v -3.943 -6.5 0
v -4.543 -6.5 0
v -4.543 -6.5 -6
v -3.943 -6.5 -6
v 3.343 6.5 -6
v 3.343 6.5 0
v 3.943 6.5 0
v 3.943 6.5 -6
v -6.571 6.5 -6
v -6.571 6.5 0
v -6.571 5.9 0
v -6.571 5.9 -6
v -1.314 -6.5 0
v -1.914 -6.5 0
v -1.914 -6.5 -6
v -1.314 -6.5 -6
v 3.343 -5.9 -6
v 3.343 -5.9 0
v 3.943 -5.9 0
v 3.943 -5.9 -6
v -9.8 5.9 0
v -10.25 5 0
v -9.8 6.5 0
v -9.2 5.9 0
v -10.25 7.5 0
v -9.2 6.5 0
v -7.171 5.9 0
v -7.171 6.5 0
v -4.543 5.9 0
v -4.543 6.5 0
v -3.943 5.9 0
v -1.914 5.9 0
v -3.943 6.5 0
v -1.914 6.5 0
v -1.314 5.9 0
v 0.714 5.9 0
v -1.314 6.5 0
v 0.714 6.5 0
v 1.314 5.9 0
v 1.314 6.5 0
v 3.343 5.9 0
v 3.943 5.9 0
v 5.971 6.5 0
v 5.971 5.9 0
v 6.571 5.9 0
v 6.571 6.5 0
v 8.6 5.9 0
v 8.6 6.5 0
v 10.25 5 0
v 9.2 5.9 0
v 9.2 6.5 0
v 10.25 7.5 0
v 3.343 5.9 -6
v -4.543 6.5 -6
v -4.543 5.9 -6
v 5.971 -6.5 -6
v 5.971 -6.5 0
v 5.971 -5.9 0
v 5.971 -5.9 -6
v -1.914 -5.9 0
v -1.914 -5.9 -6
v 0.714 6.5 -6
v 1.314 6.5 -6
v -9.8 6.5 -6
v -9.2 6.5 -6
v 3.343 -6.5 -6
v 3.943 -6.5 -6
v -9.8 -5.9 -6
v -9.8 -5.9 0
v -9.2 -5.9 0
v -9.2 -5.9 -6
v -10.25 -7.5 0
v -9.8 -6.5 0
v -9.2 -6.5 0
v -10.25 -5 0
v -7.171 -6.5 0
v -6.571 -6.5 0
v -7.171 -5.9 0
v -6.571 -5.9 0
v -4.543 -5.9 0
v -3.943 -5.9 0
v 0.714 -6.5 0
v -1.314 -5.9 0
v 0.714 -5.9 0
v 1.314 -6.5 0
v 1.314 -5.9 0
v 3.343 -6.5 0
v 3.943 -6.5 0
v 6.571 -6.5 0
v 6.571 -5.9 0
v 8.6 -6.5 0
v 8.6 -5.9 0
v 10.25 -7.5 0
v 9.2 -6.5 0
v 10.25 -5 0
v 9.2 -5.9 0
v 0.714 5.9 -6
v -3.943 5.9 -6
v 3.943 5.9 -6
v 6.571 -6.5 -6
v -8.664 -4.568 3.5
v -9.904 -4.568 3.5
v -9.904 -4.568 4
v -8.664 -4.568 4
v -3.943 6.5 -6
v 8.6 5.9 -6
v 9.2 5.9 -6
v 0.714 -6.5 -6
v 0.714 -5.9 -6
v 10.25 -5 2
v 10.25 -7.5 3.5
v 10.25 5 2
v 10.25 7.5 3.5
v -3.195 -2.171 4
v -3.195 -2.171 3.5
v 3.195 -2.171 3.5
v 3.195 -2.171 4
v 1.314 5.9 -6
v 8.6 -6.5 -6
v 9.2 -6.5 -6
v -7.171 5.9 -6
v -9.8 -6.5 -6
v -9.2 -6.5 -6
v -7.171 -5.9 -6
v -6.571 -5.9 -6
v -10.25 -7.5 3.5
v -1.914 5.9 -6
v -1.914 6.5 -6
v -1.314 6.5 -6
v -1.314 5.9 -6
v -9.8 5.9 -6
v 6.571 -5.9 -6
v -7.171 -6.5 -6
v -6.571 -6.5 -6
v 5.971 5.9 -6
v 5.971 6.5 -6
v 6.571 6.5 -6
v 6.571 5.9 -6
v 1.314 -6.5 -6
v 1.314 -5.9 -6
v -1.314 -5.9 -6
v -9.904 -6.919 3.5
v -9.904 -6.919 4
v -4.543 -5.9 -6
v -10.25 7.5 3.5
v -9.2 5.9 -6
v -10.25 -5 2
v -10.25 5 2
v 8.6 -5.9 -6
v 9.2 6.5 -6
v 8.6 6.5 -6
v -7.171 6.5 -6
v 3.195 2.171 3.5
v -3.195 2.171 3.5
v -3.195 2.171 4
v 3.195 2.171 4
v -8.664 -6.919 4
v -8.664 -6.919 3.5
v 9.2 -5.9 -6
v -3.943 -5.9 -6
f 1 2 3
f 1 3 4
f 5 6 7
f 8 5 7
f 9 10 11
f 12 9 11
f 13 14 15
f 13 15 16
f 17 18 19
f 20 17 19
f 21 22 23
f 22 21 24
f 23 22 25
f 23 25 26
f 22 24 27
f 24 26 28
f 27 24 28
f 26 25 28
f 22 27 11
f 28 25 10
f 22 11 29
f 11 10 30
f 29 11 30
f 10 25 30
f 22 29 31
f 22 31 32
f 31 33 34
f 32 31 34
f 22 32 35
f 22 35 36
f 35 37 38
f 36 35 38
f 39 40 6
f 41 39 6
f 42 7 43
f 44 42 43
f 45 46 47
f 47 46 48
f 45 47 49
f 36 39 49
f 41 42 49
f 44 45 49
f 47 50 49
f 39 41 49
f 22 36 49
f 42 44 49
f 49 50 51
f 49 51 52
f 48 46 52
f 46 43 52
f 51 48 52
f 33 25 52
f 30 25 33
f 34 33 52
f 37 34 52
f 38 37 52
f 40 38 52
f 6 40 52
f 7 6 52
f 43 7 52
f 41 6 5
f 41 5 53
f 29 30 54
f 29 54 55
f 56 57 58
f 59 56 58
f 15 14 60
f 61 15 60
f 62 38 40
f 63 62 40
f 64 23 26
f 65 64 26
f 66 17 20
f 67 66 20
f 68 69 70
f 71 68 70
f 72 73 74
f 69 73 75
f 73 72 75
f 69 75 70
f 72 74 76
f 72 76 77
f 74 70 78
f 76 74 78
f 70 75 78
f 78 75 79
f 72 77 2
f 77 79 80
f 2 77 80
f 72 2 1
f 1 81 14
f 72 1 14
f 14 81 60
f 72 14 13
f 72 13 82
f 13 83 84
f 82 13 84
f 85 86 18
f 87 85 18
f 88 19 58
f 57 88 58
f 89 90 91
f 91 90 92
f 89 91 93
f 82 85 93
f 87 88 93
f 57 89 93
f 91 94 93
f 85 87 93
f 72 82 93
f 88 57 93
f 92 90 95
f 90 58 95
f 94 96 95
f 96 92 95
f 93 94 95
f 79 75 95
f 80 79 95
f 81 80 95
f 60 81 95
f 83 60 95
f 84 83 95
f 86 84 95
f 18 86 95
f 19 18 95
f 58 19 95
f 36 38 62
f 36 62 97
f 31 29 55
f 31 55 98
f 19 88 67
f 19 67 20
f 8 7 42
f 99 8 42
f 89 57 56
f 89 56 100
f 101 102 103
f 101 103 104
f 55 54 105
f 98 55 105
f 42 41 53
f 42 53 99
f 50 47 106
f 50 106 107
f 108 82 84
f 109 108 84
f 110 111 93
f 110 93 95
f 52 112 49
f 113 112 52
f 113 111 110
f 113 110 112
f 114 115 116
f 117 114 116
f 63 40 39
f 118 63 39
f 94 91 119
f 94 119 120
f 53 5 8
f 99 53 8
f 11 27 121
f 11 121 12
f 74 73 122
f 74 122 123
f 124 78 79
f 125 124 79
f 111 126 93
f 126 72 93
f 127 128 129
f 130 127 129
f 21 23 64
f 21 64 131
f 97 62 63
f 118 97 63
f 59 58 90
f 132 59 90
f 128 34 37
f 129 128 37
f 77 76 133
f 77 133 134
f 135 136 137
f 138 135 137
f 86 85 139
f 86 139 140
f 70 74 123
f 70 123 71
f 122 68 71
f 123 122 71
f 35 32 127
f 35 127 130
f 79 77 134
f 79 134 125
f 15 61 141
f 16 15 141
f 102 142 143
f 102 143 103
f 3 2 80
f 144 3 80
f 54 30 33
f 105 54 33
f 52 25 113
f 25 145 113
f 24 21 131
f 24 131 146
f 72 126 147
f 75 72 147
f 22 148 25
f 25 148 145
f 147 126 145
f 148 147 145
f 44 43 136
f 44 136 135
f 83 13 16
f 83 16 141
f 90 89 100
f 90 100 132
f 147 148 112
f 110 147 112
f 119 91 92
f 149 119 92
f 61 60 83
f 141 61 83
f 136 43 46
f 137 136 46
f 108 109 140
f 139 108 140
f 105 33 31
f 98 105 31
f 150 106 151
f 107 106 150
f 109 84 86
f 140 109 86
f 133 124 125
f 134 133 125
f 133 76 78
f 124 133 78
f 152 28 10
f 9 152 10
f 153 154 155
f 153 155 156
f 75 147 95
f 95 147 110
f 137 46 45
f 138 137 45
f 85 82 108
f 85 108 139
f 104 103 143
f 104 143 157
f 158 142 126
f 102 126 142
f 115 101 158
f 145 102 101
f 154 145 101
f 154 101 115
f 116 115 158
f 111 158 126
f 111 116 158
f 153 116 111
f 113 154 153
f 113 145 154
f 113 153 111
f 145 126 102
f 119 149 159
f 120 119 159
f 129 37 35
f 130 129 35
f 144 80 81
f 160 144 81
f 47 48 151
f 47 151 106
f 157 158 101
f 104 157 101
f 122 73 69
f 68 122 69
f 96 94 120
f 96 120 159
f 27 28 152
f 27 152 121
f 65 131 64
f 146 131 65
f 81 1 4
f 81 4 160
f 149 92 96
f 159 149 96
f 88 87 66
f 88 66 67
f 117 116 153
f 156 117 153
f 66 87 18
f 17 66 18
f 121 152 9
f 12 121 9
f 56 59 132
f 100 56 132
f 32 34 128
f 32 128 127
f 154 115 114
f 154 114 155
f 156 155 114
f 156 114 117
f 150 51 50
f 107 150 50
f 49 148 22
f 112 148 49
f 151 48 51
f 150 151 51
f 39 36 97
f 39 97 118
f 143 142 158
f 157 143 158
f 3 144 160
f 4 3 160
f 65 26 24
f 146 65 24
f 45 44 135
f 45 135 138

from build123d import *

# Parameters (mm, degrees)
SKETCH069_W                  = 20.5
SKETCH069_H                  = 15
PAD036_DEPTH                 = 1.5
SKETCH071_W                  = 0.6
SKETCH071_H                  = 0.6
PAD037_DEPTH                 = 8
SKETCH071_LINEARPATTERN_2_W  = 0.6
SKETCH071_LINEARPATTERN_2_H  = 0.6
PAD037_LINEARPATTERN_2_DEPTH = 8
SKETCH071_LINEARPATTERN_3_W  = 0.6
SKETCH071_LINEARPATTERN_3_H  = 0.6
PAD037_LINEARPATTERN_3_DEPTH = 8
SKETCH071_LINEARPATTERN_4_W  = 0.6
SKETCH071_LINEARPATTERN_4_H  = 0.6
PAD037_LINEARPATTERN_4_DEPTH = 8
SKETCH071_LINEARPATTERN_5_W  = 0.6
SKETCH071_LINEARPATTERN_5_H  = 0.6
PAD037_LINEARPATTERN_5_DEPTH = 8
SKETCH071_LINEARPATTERN_6_W  = 0.6
SKETCH071_LINEARPATTERN_6_H  = 0.6
PAD037_LINEARPATTERN_6_DEPTH = 8
SKETCH071_LINEARPATTERN_7_W  = 0.6
SKETCH071_LINEARPATTERN_7_H  = 0.6
PAD037_LINEARPATTERN_7_DEPTH = 8
SKETCH071_LINEARPATTERN_8_W  = 0.6
SKETCH071_LINEARPATTERN_8_H  = 0.6
PAD037_LINEARPATTERN_8_DEPTH = 8
SKETCH070_W                  = 20.5
SKETCH070_H                  = 2.5
PAD038_DEPTH                 = 2
SKETCH074_W                  = 1.239915
SKETCH074_H                  = 2.350915
SKETCH074_W_2                = 6.389756
SKETCH074_H_2                = 4.341472
PAD040_DEPTH                 = 0.5


with BuildPart() as part:
    # Sketch069 → Pad036 (new body)
    with BuildSketch(Plane.XY.offset(2)):
        Rectangle(SKETCH069_W, SKETCH069_H)
    extrude(amount=PAD036_DEPTH)

    # Sketch071 → Pad037 (join)
    with BuildSketch(Plane(origin=(-9.5, -6.2, 2), x_dir=(1, 0, 0), z_dir=(0, 0, 1))):
        Rectangle(SKETCH071_W, SKETCH071_H)
    pad037 = extrude(amount=-PAD037_DEPTH)

    # Sketch071 LinearPattern 2 → Pad037 LinearPattern 2 (add)
    with BuildSketch(Plane(origin=(-6.871429, -6.2, 2), x_dir=(1, 0, 0), z_dir=(0, 0, 1))):
        Rectangle(SKETCH071_LINEARPATTERN_2_W, SKETCH071_LINEARPATTERN_2_H)
    pad037_linearpattern_2 = extrude(amount=-PAD037_LINEARPATTERN_2_DEPTH)

    # Sketch071 LinearPattern 3 → Pad037 LinearPattern 3 (add)
    with BuildSketch(Plane(origin=(-4.242857, -6.2, 2), x_dir=(1, 0, 0), z_dir=(0, 0, 1))):
        Rectangle(SKETCH071_LINEARPATTERN_3_W, SKETCH071_LINEARPATTERN_3_H)
    pad037_linearpattern_3 = extrude(amount=-PAD037_LINEARPATTERN_3_DEPTH)

    # Sketch071 LinearPattern 4 → Pad037 LinearPattern 4 (add)
    with BuildSketch(Plane(origin=(-1.614286, -6.2, 2), x_dir=(1, 0, 0), z_dir=(0, 0, 1))):
        Rectangle(SKETCH071_LINEARPATTERN_4_W, SKETCH071_LINEARPATTERN_4_H)
    pad037_linearpattern_4 = extrude(amount=-PAD037_LINEARPATTERN_4_DEPTH)

    # Sketch071 LinearPattern 5 → Pad037 LinearPattern 5 (add)
    with BuildSketch(Plane(origin=(1.014286, -6.2, 2), x_dir=(1, 0, 0), z_dir=(0, 0, 1))):
        Rectangle(SKETCH071_LINEARPATTERN_5_W, SKETCH071_LINEARPATTERN_5_H)
    pad037_linearpattern_5 = extrude(amount=-PAD037_LINEARPATTERN_5_DEPTH)

    # Sketch071 LinearPattern 6 → Pad037 LinearPattern 6 (add)
    with BuildSketch(Plane(origin=(3.642857, -6.2, 2), x_dir=(1, 0, 0), z_dir=(0, 0, 1))):
        Rectangle(SKETCH071_LINEARPATTERN_6_W, SKETCH071_LINEARPATTERN_6_H)
    pad037_linearpattern_6 = extrude(amount=-PAD037_LINEARPATTERN_6_DEPTH)

    # Sketch071 LinearPattern 7 → Pad037 LinearPattern 7 (add)
    with BuildSketch(Plane(origin=(6.271429, -6.2, 2), x_dir=(1, 0, 0), z_dir=(0, 0, 1))):
        Rectangle(SKETCH071_LINEARPATTERN_7_W, SKETCH071_LINEARPATTERN_7_H)
    pad037_linearpattern_7 = extrude(amount=-PAD037_LINEARPATTERN_7_DEPTH)

    # Sketch071 LinearPattern 8 → Pad037 LinearPattern 8 (add)
    with BuildSketch(Plane(origin=(8.9, -6.2, 2), x_dir=(1, 0, 0), z_dir=(0, 0, 1))):
        Rectangle(SKETCH071_LINEARPATTERN_8_W, SKETCH071_LINEARPATTERN_8_H)
    pad037_linearpattern_8 = extrude(amount=-PAD037_LINEARPATTERN_8_DEPTH)

    # Mirrored: Pad037, Pad037 LinearPattern 2, Pad037 LinearPattern 3, Pad037 LinearPattern 4, Pad037 LinearPattern 5, Pad037 LinearPattern 6, Pad037 LinearPattern 7, Pad037 LinearPattern 8 across XZ
    add(pad037.mirror(Plane.XZ))
    add(pad037_linearpattern_2.mirror(Plane.XZ))
    add(pad037_linearpattern_3.mirror(Plane.XZ))
    add(pad037_linearpattern_4.mirror(Plane.XZ))
    add(pad037_linearpattern_5.mirror(Plane.XZ))
    add(pad037_linearpattern_6.mirror(Plane.XZ))
    add(pad037_linearpattern_7.mirror(Plane.XZ))
    add(pad037_linearpattern_8.mirror(Plane.XZ))

    # Sketch070 → Pad038 (join)
    with BuildSketch(Plane.XY.offset(2)):
        with Locations((0, 6.25)):
            Rectangle(SKETCH070_W, SKETCH070_H)
        with Locations((0, -6.25)):
            Rectangle(SKETCH070_W, SKETCH070_H)
    extrude(amount=-PAD038_DEPTH)

    # Sketch074 → Pad040 (join)
    with BuildSketch(Plane.XY.offset(3.5)):
        with Locations((-9.283549, -5.743839)):
            Rectangle(SKETCH074_W, SKETCH074_H)
        Rectangle(SKETCH074_W_2, SKETCH074_H_2)
    extrude(amount=PAD040_DEPTH)


solid = part.part
